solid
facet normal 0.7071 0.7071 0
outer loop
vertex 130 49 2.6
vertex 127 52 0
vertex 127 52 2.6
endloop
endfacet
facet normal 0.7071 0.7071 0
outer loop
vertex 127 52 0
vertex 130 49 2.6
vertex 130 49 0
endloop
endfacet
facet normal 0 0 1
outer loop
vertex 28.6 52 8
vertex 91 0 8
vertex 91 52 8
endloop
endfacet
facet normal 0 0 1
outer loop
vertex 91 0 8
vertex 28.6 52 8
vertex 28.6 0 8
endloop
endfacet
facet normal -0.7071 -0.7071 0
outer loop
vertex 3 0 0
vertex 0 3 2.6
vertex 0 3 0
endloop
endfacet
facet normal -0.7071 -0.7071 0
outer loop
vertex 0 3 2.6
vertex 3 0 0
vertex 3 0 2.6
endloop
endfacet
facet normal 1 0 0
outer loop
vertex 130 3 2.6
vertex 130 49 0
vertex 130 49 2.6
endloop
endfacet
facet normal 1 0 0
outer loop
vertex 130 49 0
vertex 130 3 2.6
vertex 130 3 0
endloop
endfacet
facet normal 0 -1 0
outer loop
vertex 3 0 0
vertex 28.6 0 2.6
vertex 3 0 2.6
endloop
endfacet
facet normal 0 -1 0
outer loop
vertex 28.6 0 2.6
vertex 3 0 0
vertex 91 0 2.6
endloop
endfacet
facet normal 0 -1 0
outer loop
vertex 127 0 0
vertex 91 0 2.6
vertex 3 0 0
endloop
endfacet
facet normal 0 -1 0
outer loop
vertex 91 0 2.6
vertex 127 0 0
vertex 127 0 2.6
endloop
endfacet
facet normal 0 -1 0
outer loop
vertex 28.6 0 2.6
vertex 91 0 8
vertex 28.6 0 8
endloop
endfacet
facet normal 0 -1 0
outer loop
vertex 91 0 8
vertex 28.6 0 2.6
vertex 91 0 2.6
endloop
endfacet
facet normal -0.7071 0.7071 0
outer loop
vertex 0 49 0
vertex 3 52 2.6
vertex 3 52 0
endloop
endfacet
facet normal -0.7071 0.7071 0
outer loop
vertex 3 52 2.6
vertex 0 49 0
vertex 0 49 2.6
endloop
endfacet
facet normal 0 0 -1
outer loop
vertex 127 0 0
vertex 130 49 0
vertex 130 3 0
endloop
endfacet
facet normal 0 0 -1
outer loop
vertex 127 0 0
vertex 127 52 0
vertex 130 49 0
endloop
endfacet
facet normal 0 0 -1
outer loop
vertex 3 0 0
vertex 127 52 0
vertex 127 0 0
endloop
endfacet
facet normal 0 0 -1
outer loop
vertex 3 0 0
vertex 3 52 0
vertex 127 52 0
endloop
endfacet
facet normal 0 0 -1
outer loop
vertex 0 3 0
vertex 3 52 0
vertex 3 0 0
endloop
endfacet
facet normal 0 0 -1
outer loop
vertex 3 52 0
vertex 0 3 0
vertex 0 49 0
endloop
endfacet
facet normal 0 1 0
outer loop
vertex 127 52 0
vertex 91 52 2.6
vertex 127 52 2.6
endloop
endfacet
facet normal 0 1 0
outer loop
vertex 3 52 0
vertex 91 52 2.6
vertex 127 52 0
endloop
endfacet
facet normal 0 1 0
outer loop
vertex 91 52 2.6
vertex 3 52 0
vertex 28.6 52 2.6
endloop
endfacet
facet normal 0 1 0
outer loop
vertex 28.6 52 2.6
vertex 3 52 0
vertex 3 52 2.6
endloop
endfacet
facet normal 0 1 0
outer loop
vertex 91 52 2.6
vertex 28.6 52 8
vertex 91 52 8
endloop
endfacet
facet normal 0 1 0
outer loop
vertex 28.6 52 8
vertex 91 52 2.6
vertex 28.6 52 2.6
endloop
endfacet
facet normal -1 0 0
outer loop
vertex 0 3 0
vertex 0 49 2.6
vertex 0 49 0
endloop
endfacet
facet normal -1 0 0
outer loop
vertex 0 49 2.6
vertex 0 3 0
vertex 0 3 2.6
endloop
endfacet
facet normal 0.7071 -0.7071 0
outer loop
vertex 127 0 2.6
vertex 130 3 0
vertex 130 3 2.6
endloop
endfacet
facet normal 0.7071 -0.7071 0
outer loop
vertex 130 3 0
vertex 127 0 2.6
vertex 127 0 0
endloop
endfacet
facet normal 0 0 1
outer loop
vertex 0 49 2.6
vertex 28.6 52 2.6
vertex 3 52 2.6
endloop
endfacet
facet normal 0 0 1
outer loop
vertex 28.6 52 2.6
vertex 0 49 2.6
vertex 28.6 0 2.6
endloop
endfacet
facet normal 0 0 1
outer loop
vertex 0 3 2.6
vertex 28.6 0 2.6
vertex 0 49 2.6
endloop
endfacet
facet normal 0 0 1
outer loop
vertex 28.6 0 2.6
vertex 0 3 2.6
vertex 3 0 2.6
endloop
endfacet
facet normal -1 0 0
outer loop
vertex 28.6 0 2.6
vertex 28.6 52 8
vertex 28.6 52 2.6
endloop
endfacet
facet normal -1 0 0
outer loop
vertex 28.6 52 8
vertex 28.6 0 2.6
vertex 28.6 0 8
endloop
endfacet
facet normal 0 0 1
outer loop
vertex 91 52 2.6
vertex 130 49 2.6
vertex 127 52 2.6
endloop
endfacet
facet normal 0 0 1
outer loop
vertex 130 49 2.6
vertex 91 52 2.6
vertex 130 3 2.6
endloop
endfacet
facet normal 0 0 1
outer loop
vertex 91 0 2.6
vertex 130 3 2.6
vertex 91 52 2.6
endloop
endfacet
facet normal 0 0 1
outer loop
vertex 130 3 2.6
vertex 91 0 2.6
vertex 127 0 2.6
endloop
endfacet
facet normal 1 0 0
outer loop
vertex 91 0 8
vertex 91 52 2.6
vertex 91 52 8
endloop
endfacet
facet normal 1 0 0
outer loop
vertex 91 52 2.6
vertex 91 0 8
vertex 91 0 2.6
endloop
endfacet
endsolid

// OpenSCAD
$fn = 32;

// ----------------------------------------------------------------------
// Stepped bar: centerstep, 130 x 52 x 8/2.6 mm
// ----------------------------------------------------------------------

// --- parameters (mm) ---
bar_l = 130;              // bar length, X
bar_w = 52;               // bar width, Y
plate_t = 8;              // thickness of the thick zone, Z
thin_t = 2.6;             // thickness of the thin zone
corner_c = 3;             // corner chamfer of the bar
step_cut = 5.4;           // material removed from the thin zone
thick_from = 28.6;        // start of the thick middle zone
thick_to = 91;            // end of the thick middle zone
depth_1 = 5.4;            // depth of cut 1 from the top face
depth_2 = 5.4;            // depth of cut 2 from the top face

profile = [[3, 0], [127, 0], [130, 3], [130, 49], [127, 52], [3, 52], [0, 49], [0, 3]];  // primary outline, 8 points, counter clockwise
void_1 = [[-1, -1], [28.6, -1], [28.6, 53], [-1, 53]];  // thin left end, 4 points
void_2 = [[91, -1], [131, -1], [131, 53], [91, 53]];  // thin right end, 4 points

// --- the one profile operation ---
difference() {
  linear_extrude(height = plate_t) polygon(points = profile);
  translate([0, 0, plate_t - depth_1])
    linear_extrude(height = depth_1 + 1) polygon(points = void_1);
  translate([0, 0, plate_t - depth_2])
    linear_extrude(height = depth_2 + 1) polygon(points = void_2);
}
